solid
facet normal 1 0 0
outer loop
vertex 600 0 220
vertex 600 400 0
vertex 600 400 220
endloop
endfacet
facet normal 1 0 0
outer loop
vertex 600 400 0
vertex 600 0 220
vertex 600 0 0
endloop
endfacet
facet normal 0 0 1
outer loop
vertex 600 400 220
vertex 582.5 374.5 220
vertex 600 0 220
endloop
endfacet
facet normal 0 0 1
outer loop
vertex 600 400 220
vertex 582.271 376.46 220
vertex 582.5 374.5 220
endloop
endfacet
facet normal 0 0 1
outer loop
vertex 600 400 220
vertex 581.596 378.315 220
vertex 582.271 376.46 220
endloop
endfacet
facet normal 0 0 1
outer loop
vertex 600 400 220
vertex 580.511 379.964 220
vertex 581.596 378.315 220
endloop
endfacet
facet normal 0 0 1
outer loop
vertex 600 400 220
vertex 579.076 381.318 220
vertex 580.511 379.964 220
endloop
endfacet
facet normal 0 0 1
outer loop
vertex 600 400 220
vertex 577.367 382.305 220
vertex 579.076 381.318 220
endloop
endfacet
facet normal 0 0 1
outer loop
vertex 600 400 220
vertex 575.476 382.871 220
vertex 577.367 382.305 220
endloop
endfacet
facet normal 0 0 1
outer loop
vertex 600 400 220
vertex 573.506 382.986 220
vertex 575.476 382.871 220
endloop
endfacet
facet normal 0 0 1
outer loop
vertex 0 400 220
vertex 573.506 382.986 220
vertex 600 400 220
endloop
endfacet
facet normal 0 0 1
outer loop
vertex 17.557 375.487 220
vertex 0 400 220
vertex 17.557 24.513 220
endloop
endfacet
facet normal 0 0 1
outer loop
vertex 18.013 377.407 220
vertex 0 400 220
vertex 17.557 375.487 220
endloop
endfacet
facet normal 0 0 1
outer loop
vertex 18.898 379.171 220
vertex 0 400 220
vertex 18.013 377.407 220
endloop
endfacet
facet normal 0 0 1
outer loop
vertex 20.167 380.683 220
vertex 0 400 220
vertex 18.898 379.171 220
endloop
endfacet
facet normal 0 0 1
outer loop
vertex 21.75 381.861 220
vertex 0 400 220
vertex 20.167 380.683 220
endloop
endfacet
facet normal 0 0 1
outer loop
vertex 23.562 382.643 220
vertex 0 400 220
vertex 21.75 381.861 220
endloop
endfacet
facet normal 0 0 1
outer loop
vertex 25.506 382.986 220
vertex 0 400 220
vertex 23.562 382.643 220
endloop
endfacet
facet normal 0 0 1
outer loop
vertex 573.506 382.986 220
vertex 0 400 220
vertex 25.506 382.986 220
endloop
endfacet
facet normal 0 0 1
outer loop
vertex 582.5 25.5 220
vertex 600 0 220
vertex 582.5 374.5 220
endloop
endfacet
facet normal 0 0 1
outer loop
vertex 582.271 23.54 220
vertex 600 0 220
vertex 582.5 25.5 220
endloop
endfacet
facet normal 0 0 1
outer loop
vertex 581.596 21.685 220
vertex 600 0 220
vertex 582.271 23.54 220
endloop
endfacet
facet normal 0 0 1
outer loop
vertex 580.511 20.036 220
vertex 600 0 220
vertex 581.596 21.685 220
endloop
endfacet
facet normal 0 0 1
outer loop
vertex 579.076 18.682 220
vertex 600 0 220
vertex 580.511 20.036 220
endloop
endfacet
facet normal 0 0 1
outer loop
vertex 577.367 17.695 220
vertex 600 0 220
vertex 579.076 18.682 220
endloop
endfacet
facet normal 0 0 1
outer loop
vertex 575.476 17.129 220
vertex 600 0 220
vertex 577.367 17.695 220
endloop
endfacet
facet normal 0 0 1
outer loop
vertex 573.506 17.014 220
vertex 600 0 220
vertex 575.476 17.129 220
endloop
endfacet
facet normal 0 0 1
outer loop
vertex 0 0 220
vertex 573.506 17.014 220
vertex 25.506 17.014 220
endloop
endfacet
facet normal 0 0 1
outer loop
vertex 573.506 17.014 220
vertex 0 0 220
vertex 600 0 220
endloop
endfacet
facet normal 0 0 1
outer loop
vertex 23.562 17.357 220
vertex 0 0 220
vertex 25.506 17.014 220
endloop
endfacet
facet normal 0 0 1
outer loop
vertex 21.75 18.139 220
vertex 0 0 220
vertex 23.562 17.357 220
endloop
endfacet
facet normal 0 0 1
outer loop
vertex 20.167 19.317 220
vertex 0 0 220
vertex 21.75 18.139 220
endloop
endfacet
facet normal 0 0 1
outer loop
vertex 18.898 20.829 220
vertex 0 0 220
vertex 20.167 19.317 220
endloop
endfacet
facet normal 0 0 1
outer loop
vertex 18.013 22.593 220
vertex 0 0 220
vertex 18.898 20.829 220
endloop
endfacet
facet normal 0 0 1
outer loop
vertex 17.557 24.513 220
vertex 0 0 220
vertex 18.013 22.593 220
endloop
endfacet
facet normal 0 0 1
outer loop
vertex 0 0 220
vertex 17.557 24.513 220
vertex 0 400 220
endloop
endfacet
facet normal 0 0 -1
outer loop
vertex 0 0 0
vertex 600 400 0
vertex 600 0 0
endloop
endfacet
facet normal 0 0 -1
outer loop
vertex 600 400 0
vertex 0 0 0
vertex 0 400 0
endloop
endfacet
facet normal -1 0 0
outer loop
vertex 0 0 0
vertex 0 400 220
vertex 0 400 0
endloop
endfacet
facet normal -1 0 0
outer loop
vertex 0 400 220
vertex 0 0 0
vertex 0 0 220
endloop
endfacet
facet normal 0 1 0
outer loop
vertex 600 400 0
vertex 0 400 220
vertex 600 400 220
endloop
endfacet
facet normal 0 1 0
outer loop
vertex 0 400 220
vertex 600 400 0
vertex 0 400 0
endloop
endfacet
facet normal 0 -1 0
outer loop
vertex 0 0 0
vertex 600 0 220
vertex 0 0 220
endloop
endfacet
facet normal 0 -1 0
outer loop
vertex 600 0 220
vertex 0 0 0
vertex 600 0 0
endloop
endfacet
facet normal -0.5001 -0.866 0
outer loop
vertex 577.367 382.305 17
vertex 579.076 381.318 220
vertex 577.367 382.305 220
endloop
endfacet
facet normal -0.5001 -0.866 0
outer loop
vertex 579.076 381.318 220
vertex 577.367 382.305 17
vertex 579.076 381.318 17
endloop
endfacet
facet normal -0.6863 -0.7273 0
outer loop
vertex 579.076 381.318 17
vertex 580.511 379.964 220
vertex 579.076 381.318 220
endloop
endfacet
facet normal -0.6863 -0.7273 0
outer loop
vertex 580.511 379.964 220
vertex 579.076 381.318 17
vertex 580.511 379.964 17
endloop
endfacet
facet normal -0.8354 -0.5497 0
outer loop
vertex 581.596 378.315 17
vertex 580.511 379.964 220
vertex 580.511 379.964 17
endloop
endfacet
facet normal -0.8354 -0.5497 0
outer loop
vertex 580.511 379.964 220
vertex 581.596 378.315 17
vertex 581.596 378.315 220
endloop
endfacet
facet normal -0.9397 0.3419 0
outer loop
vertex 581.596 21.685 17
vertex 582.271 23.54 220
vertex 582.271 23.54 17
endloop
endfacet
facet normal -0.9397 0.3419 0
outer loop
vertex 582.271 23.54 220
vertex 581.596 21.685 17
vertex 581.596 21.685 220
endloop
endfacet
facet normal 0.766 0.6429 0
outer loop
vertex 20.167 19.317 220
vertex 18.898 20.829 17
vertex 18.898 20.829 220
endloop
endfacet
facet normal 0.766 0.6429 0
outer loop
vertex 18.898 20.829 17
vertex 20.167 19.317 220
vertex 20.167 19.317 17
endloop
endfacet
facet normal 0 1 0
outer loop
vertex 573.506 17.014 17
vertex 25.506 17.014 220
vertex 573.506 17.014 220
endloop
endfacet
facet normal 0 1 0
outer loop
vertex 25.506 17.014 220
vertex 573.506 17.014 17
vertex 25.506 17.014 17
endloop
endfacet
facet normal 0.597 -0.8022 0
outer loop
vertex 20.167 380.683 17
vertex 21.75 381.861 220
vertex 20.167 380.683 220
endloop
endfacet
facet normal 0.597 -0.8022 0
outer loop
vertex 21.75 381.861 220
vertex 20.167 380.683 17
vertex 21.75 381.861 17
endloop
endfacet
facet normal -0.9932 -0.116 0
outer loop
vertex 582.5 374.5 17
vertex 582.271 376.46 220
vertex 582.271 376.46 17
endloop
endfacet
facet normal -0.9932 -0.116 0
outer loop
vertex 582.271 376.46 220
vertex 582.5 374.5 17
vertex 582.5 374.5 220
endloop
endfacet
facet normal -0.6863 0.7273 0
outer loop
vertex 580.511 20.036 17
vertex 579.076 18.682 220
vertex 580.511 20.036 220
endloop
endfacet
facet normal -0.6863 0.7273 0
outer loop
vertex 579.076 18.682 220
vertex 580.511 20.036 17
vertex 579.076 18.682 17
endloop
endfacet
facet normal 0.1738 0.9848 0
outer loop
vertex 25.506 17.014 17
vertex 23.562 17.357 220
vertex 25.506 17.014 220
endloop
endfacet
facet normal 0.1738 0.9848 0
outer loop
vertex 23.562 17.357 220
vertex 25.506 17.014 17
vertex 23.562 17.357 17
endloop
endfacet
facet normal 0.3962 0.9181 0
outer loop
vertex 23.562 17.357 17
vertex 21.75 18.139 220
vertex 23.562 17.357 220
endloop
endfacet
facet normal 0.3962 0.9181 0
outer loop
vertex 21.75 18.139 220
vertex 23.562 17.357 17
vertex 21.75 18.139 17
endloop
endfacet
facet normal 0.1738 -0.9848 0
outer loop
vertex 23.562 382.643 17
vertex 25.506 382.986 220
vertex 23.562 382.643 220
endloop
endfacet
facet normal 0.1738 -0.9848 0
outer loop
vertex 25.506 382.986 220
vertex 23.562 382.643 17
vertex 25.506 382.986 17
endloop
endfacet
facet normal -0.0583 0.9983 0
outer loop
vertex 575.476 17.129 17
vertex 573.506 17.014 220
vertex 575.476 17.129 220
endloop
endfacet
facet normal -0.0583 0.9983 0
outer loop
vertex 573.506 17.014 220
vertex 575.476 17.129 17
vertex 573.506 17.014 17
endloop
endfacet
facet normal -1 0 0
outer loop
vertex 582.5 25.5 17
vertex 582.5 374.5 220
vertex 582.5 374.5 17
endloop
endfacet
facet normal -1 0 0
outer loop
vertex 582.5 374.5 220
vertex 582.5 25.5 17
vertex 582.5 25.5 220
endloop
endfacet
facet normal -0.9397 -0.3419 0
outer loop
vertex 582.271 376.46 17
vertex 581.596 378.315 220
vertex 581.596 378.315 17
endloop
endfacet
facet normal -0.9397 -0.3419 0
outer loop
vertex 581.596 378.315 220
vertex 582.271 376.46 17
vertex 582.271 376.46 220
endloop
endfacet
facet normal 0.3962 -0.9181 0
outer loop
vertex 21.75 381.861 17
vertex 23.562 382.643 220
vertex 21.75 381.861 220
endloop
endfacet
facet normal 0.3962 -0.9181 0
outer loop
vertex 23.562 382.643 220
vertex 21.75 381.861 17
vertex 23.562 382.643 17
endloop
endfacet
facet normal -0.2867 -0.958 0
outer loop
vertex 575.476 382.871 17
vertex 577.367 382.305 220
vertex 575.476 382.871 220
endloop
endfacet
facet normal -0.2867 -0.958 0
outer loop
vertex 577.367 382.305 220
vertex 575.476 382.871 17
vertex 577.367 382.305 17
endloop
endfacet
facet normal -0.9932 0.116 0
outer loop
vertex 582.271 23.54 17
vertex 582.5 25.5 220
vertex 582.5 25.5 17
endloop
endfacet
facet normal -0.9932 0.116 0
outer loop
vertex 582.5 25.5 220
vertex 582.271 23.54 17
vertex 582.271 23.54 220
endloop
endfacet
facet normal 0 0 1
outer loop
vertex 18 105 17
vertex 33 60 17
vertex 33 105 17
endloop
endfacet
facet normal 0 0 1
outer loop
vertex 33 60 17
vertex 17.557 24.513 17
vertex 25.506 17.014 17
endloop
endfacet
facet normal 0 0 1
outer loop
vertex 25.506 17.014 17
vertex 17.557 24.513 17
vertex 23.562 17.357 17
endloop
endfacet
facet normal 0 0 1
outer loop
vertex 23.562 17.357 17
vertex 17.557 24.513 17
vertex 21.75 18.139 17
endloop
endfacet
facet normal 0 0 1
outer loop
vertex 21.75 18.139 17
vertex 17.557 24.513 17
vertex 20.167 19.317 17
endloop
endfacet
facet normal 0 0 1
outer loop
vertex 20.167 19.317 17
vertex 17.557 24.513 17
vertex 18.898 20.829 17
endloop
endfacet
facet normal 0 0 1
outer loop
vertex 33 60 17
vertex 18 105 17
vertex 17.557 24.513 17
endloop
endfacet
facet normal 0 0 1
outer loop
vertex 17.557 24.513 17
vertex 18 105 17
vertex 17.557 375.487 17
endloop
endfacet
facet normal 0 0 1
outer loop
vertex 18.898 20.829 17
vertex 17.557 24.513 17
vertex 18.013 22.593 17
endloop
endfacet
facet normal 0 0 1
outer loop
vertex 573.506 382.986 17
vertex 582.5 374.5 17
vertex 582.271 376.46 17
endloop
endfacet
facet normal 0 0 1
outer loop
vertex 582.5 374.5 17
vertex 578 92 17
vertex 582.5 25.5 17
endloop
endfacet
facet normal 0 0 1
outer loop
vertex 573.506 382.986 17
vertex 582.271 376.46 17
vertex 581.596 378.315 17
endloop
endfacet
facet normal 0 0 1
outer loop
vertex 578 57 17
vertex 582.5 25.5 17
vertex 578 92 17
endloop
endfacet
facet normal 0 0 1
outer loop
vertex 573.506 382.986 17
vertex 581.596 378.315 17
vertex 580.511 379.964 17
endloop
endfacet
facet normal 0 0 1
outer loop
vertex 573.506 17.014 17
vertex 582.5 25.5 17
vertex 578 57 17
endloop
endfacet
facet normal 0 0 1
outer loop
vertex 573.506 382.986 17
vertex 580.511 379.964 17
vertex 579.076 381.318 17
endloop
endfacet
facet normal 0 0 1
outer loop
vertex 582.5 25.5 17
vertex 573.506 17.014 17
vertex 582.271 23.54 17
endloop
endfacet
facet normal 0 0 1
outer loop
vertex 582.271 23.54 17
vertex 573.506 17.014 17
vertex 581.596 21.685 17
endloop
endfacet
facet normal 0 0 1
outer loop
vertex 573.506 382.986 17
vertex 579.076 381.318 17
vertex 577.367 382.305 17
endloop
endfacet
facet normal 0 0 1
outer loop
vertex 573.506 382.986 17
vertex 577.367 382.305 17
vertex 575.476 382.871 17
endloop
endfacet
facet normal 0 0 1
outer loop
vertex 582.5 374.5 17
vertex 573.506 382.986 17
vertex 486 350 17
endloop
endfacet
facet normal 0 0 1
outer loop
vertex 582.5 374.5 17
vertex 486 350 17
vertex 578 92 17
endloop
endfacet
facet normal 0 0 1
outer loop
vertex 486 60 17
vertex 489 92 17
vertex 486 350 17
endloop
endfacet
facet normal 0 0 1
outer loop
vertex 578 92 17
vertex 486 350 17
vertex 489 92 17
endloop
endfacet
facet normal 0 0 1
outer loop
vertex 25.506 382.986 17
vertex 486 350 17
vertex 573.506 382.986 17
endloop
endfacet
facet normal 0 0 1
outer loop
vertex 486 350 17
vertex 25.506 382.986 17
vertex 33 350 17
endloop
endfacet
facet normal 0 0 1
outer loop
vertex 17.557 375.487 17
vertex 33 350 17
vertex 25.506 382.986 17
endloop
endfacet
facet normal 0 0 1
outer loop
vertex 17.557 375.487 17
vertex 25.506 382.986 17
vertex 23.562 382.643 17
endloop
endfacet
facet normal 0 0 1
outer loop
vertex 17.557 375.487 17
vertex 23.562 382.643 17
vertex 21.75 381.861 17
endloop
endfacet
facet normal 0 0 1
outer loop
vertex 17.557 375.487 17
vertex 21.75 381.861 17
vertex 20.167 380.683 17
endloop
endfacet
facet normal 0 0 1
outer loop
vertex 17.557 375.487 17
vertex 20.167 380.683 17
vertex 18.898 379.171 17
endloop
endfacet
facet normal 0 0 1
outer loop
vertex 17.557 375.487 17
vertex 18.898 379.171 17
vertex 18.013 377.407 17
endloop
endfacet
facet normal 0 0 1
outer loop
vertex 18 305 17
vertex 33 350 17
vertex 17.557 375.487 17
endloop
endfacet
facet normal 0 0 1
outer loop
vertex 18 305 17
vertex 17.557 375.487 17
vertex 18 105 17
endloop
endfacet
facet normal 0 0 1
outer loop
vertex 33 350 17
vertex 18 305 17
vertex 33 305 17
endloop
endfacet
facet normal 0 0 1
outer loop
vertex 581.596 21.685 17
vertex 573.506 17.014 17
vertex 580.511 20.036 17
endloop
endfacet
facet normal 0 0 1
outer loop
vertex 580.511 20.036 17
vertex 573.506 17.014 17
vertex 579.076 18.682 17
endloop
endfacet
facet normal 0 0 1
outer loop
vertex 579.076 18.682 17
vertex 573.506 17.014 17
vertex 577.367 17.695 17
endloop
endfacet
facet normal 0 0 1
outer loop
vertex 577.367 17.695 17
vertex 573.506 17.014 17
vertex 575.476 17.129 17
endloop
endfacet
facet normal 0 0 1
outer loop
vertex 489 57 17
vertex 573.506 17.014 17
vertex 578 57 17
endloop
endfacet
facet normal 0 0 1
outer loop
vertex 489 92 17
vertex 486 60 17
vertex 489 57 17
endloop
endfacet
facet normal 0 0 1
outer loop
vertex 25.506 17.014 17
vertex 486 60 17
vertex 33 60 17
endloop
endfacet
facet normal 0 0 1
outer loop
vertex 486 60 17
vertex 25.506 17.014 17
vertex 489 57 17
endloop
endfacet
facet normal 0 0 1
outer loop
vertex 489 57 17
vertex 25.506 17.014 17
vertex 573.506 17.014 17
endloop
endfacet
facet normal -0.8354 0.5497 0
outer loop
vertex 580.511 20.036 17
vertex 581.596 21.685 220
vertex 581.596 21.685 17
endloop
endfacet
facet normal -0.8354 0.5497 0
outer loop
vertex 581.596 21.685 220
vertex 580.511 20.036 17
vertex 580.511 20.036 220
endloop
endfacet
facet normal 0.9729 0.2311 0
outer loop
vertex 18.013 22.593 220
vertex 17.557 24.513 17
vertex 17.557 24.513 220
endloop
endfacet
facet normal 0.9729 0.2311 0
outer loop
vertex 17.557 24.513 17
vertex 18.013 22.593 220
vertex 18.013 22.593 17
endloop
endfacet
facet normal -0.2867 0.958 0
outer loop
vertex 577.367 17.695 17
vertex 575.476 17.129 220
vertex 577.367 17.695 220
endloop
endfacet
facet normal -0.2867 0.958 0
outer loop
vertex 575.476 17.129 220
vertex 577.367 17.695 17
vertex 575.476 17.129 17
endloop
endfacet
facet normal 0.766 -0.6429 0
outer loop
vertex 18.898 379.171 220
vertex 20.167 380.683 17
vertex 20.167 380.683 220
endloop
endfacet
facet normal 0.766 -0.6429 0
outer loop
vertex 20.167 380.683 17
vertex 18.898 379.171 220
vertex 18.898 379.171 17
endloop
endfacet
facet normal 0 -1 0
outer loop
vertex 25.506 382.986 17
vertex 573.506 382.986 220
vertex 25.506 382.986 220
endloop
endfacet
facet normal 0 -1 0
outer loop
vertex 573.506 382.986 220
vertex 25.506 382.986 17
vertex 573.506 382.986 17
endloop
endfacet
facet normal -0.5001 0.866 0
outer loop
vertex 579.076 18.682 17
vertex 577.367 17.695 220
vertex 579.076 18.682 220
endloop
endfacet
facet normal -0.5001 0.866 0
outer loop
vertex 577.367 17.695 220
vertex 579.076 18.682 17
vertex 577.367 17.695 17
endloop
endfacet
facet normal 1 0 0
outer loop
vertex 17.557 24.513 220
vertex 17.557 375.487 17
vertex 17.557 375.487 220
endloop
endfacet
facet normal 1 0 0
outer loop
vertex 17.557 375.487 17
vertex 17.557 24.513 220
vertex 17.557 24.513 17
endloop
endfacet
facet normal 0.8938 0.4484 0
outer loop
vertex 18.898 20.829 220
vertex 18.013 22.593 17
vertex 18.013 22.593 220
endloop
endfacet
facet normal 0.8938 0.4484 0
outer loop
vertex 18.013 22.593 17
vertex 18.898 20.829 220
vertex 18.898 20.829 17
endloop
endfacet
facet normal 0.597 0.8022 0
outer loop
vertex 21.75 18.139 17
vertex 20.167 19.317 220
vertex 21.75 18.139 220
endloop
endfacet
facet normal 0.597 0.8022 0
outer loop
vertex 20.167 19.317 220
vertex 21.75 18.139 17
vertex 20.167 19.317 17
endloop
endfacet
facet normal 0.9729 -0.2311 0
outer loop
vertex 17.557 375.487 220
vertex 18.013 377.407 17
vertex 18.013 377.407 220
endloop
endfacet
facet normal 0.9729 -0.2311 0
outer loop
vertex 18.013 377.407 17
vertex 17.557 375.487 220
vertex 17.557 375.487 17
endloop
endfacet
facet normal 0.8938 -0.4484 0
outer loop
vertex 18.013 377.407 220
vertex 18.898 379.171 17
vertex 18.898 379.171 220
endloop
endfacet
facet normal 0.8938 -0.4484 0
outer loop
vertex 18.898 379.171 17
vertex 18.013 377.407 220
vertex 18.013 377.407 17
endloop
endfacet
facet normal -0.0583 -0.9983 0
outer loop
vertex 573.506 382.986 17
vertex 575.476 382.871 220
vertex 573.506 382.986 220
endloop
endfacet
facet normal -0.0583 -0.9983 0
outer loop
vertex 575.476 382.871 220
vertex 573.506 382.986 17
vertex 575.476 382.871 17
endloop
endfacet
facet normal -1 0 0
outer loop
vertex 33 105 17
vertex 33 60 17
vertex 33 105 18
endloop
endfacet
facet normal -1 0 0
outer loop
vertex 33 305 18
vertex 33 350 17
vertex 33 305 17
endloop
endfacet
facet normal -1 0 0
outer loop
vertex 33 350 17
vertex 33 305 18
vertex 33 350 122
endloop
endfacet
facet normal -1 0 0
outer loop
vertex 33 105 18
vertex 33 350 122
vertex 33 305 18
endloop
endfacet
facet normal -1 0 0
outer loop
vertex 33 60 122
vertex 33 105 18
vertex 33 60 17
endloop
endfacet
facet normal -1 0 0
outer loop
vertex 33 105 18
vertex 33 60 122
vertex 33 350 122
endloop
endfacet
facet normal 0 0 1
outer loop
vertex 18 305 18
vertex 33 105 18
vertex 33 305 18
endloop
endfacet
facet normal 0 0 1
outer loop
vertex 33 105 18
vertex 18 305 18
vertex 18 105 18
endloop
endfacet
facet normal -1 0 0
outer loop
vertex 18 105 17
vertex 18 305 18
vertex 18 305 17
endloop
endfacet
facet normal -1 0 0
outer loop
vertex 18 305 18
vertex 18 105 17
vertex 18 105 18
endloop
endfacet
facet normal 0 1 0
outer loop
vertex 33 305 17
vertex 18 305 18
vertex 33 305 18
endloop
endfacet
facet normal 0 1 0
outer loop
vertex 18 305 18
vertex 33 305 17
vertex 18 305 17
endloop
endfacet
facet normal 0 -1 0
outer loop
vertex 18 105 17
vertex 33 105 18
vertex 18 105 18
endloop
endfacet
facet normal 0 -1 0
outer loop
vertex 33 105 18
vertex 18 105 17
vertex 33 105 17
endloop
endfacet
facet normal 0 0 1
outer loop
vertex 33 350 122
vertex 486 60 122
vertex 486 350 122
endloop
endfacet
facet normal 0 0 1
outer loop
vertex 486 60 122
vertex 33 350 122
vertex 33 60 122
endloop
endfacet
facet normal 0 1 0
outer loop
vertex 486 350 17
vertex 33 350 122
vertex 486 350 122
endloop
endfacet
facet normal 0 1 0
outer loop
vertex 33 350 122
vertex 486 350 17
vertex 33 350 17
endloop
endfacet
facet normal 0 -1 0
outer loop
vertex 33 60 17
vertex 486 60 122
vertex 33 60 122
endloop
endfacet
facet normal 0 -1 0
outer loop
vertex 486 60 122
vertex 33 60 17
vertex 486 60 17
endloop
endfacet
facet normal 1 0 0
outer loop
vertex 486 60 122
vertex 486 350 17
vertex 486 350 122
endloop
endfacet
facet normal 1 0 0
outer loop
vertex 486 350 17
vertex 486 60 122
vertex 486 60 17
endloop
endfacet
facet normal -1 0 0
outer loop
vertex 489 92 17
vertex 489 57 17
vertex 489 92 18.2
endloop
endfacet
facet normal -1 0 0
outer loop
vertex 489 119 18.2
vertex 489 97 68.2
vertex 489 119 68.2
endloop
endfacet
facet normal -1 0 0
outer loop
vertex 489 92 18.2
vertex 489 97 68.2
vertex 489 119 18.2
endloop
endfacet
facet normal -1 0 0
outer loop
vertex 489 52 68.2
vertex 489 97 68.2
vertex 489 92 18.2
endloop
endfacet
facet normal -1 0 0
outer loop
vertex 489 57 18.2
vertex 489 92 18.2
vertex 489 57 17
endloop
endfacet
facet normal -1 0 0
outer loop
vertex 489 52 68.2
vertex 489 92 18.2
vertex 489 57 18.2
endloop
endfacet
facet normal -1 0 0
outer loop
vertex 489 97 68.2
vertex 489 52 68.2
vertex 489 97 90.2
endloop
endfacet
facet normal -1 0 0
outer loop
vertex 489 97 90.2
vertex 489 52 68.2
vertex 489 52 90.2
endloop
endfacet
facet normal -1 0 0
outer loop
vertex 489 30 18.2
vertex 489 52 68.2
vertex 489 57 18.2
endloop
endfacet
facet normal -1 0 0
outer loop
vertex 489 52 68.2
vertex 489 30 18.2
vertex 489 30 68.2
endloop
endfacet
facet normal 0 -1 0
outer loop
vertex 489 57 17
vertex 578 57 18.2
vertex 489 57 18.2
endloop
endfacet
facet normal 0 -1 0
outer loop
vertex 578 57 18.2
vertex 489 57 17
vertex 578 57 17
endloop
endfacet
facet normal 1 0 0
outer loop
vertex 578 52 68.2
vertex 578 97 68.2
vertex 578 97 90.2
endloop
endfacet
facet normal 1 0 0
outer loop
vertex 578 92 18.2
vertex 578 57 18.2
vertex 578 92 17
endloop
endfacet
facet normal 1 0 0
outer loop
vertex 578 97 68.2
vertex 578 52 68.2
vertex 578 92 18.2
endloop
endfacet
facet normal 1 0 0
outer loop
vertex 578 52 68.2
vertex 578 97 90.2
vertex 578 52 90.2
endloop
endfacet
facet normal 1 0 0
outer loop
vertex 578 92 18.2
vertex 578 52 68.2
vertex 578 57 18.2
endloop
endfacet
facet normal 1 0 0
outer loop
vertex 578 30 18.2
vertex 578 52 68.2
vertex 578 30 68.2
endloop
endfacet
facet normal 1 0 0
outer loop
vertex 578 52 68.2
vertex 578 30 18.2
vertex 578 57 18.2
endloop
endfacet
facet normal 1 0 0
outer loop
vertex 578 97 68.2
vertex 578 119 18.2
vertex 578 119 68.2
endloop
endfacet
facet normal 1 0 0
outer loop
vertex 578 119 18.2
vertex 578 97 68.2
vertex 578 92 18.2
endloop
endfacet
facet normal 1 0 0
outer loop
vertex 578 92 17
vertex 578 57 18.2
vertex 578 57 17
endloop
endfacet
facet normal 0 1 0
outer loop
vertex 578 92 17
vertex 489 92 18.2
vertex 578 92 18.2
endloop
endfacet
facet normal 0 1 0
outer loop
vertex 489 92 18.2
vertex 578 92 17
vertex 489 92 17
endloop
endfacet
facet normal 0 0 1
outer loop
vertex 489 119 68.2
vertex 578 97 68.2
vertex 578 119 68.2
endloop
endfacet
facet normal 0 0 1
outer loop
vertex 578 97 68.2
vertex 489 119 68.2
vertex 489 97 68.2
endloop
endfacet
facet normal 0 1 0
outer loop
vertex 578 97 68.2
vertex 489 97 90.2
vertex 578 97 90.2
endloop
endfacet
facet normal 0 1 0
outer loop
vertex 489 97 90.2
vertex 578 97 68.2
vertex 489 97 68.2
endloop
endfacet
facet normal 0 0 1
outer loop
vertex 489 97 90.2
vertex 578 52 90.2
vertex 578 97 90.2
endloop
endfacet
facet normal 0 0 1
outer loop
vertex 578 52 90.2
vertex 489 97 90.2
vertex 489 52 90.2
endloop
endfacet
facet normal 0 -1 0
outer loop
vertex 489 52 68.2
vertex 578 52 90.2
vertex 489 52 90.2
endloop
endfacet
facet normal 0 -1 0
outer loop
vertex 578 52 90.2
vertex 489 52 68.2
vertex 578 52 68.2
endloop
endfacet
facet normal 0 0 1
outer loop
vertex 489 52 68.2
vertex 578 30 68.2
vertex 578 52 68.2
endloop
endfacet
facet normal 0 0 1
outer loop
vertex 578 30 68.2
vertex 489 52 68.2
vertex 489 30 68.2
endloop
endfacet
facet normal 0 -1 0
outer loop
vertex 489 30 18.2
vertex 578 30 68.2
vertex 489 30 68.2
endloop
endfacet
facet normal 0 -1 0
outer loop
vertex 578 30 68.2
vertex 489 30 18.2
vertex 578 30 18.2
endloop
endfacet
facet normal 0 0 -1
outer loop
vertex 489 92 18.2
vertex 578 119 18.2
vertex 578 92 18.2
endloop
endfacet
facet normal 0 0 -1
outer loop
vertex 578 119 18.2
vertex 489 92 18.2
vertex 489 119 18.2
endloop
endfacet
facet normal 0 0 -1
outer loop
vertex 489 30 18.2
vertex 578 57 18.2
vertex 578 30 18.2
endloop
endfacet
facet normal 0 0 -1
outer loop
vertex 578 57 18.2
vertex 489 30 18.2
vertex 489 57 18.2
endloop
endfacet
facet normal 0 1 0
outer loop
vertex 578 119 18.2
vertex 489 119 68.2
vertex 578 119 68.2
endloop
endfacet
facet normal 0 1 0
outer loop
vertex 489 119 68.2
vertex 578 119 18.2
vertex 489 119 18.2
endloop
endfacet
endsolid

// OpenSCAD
euroboxInnerHeight = 220-203;

module eurobox(){
    // EG 64/22 WB
    
    outer = [600, 400, 220];
    inner = [565, 366, 203]; // x+y gemessen und 2mm Toleranz abgezogen, Z aus Datenblatt
    innerRadius = 8.5; // grob gemessen
    
    color("grey")
    difference(){
        cube(outer);
        
        translate([(outer.x-(inner.x-innerRadius*2))/2, (outer.y-(inner.y-innerRadius*2))/2, outer.z-inner.z])
            linear_extrude(inner.z+1)
            minkowski(){
                square([inner.x - innerRadius*2, inner.y - innerRadius*2]);
                circle(r=innerRadius);
            };
    }
}

module inverter(){
    tabSize = [15, 200, 1];
    inverterSize = [423, 290, 105];
    
    union(){
        color("darkgrey")
        translate([0, inverterSize.y/2 - tabSize.y/2, 0])
            cube(tabSize);
        color("lightblue")
            translate([tabSize.x, 0, 0])
            cube(inverterSize);
        color("red", 0.2)
            translate([tabSize.x + inverterSize.x, 0, 0])
            cube([30, inverterSize.y, inverterSize.z]);
    }
}

module dinrail(te){
    teWidth = 17.8;
    railDepth = 7.5;
    railHeight = 35;
    
    lssBodySize = [89, 50];
    lssProtrusionSize = [45, 72];
    
    translate([lssBodySize.x/2, 0])
    union(){
        color("grey")
        linear_extrude(te*teWidth){
            translate([-railHeight/2, 0])
                square([railHeight, railDepth]);
        }
        
        color("lightgrey")
        linear_extrude(te*teWidth){
            union(){
                translate([-lssBodySize.x/2, railDepth - 6.3])
                    square(lssBodySize);
                translate([-lssProtrusionSize.x/2, railDepth - 6.3])
                    square(lssProtrusionSize);

            }
        }
    }
}

eurobox();

translate([18, 60, euroboxInnerHeight])
    inverter();

translate([489, 30, euroboxInnerHeight])
    rotate([90, 0, 90])
    dinrail(5);
